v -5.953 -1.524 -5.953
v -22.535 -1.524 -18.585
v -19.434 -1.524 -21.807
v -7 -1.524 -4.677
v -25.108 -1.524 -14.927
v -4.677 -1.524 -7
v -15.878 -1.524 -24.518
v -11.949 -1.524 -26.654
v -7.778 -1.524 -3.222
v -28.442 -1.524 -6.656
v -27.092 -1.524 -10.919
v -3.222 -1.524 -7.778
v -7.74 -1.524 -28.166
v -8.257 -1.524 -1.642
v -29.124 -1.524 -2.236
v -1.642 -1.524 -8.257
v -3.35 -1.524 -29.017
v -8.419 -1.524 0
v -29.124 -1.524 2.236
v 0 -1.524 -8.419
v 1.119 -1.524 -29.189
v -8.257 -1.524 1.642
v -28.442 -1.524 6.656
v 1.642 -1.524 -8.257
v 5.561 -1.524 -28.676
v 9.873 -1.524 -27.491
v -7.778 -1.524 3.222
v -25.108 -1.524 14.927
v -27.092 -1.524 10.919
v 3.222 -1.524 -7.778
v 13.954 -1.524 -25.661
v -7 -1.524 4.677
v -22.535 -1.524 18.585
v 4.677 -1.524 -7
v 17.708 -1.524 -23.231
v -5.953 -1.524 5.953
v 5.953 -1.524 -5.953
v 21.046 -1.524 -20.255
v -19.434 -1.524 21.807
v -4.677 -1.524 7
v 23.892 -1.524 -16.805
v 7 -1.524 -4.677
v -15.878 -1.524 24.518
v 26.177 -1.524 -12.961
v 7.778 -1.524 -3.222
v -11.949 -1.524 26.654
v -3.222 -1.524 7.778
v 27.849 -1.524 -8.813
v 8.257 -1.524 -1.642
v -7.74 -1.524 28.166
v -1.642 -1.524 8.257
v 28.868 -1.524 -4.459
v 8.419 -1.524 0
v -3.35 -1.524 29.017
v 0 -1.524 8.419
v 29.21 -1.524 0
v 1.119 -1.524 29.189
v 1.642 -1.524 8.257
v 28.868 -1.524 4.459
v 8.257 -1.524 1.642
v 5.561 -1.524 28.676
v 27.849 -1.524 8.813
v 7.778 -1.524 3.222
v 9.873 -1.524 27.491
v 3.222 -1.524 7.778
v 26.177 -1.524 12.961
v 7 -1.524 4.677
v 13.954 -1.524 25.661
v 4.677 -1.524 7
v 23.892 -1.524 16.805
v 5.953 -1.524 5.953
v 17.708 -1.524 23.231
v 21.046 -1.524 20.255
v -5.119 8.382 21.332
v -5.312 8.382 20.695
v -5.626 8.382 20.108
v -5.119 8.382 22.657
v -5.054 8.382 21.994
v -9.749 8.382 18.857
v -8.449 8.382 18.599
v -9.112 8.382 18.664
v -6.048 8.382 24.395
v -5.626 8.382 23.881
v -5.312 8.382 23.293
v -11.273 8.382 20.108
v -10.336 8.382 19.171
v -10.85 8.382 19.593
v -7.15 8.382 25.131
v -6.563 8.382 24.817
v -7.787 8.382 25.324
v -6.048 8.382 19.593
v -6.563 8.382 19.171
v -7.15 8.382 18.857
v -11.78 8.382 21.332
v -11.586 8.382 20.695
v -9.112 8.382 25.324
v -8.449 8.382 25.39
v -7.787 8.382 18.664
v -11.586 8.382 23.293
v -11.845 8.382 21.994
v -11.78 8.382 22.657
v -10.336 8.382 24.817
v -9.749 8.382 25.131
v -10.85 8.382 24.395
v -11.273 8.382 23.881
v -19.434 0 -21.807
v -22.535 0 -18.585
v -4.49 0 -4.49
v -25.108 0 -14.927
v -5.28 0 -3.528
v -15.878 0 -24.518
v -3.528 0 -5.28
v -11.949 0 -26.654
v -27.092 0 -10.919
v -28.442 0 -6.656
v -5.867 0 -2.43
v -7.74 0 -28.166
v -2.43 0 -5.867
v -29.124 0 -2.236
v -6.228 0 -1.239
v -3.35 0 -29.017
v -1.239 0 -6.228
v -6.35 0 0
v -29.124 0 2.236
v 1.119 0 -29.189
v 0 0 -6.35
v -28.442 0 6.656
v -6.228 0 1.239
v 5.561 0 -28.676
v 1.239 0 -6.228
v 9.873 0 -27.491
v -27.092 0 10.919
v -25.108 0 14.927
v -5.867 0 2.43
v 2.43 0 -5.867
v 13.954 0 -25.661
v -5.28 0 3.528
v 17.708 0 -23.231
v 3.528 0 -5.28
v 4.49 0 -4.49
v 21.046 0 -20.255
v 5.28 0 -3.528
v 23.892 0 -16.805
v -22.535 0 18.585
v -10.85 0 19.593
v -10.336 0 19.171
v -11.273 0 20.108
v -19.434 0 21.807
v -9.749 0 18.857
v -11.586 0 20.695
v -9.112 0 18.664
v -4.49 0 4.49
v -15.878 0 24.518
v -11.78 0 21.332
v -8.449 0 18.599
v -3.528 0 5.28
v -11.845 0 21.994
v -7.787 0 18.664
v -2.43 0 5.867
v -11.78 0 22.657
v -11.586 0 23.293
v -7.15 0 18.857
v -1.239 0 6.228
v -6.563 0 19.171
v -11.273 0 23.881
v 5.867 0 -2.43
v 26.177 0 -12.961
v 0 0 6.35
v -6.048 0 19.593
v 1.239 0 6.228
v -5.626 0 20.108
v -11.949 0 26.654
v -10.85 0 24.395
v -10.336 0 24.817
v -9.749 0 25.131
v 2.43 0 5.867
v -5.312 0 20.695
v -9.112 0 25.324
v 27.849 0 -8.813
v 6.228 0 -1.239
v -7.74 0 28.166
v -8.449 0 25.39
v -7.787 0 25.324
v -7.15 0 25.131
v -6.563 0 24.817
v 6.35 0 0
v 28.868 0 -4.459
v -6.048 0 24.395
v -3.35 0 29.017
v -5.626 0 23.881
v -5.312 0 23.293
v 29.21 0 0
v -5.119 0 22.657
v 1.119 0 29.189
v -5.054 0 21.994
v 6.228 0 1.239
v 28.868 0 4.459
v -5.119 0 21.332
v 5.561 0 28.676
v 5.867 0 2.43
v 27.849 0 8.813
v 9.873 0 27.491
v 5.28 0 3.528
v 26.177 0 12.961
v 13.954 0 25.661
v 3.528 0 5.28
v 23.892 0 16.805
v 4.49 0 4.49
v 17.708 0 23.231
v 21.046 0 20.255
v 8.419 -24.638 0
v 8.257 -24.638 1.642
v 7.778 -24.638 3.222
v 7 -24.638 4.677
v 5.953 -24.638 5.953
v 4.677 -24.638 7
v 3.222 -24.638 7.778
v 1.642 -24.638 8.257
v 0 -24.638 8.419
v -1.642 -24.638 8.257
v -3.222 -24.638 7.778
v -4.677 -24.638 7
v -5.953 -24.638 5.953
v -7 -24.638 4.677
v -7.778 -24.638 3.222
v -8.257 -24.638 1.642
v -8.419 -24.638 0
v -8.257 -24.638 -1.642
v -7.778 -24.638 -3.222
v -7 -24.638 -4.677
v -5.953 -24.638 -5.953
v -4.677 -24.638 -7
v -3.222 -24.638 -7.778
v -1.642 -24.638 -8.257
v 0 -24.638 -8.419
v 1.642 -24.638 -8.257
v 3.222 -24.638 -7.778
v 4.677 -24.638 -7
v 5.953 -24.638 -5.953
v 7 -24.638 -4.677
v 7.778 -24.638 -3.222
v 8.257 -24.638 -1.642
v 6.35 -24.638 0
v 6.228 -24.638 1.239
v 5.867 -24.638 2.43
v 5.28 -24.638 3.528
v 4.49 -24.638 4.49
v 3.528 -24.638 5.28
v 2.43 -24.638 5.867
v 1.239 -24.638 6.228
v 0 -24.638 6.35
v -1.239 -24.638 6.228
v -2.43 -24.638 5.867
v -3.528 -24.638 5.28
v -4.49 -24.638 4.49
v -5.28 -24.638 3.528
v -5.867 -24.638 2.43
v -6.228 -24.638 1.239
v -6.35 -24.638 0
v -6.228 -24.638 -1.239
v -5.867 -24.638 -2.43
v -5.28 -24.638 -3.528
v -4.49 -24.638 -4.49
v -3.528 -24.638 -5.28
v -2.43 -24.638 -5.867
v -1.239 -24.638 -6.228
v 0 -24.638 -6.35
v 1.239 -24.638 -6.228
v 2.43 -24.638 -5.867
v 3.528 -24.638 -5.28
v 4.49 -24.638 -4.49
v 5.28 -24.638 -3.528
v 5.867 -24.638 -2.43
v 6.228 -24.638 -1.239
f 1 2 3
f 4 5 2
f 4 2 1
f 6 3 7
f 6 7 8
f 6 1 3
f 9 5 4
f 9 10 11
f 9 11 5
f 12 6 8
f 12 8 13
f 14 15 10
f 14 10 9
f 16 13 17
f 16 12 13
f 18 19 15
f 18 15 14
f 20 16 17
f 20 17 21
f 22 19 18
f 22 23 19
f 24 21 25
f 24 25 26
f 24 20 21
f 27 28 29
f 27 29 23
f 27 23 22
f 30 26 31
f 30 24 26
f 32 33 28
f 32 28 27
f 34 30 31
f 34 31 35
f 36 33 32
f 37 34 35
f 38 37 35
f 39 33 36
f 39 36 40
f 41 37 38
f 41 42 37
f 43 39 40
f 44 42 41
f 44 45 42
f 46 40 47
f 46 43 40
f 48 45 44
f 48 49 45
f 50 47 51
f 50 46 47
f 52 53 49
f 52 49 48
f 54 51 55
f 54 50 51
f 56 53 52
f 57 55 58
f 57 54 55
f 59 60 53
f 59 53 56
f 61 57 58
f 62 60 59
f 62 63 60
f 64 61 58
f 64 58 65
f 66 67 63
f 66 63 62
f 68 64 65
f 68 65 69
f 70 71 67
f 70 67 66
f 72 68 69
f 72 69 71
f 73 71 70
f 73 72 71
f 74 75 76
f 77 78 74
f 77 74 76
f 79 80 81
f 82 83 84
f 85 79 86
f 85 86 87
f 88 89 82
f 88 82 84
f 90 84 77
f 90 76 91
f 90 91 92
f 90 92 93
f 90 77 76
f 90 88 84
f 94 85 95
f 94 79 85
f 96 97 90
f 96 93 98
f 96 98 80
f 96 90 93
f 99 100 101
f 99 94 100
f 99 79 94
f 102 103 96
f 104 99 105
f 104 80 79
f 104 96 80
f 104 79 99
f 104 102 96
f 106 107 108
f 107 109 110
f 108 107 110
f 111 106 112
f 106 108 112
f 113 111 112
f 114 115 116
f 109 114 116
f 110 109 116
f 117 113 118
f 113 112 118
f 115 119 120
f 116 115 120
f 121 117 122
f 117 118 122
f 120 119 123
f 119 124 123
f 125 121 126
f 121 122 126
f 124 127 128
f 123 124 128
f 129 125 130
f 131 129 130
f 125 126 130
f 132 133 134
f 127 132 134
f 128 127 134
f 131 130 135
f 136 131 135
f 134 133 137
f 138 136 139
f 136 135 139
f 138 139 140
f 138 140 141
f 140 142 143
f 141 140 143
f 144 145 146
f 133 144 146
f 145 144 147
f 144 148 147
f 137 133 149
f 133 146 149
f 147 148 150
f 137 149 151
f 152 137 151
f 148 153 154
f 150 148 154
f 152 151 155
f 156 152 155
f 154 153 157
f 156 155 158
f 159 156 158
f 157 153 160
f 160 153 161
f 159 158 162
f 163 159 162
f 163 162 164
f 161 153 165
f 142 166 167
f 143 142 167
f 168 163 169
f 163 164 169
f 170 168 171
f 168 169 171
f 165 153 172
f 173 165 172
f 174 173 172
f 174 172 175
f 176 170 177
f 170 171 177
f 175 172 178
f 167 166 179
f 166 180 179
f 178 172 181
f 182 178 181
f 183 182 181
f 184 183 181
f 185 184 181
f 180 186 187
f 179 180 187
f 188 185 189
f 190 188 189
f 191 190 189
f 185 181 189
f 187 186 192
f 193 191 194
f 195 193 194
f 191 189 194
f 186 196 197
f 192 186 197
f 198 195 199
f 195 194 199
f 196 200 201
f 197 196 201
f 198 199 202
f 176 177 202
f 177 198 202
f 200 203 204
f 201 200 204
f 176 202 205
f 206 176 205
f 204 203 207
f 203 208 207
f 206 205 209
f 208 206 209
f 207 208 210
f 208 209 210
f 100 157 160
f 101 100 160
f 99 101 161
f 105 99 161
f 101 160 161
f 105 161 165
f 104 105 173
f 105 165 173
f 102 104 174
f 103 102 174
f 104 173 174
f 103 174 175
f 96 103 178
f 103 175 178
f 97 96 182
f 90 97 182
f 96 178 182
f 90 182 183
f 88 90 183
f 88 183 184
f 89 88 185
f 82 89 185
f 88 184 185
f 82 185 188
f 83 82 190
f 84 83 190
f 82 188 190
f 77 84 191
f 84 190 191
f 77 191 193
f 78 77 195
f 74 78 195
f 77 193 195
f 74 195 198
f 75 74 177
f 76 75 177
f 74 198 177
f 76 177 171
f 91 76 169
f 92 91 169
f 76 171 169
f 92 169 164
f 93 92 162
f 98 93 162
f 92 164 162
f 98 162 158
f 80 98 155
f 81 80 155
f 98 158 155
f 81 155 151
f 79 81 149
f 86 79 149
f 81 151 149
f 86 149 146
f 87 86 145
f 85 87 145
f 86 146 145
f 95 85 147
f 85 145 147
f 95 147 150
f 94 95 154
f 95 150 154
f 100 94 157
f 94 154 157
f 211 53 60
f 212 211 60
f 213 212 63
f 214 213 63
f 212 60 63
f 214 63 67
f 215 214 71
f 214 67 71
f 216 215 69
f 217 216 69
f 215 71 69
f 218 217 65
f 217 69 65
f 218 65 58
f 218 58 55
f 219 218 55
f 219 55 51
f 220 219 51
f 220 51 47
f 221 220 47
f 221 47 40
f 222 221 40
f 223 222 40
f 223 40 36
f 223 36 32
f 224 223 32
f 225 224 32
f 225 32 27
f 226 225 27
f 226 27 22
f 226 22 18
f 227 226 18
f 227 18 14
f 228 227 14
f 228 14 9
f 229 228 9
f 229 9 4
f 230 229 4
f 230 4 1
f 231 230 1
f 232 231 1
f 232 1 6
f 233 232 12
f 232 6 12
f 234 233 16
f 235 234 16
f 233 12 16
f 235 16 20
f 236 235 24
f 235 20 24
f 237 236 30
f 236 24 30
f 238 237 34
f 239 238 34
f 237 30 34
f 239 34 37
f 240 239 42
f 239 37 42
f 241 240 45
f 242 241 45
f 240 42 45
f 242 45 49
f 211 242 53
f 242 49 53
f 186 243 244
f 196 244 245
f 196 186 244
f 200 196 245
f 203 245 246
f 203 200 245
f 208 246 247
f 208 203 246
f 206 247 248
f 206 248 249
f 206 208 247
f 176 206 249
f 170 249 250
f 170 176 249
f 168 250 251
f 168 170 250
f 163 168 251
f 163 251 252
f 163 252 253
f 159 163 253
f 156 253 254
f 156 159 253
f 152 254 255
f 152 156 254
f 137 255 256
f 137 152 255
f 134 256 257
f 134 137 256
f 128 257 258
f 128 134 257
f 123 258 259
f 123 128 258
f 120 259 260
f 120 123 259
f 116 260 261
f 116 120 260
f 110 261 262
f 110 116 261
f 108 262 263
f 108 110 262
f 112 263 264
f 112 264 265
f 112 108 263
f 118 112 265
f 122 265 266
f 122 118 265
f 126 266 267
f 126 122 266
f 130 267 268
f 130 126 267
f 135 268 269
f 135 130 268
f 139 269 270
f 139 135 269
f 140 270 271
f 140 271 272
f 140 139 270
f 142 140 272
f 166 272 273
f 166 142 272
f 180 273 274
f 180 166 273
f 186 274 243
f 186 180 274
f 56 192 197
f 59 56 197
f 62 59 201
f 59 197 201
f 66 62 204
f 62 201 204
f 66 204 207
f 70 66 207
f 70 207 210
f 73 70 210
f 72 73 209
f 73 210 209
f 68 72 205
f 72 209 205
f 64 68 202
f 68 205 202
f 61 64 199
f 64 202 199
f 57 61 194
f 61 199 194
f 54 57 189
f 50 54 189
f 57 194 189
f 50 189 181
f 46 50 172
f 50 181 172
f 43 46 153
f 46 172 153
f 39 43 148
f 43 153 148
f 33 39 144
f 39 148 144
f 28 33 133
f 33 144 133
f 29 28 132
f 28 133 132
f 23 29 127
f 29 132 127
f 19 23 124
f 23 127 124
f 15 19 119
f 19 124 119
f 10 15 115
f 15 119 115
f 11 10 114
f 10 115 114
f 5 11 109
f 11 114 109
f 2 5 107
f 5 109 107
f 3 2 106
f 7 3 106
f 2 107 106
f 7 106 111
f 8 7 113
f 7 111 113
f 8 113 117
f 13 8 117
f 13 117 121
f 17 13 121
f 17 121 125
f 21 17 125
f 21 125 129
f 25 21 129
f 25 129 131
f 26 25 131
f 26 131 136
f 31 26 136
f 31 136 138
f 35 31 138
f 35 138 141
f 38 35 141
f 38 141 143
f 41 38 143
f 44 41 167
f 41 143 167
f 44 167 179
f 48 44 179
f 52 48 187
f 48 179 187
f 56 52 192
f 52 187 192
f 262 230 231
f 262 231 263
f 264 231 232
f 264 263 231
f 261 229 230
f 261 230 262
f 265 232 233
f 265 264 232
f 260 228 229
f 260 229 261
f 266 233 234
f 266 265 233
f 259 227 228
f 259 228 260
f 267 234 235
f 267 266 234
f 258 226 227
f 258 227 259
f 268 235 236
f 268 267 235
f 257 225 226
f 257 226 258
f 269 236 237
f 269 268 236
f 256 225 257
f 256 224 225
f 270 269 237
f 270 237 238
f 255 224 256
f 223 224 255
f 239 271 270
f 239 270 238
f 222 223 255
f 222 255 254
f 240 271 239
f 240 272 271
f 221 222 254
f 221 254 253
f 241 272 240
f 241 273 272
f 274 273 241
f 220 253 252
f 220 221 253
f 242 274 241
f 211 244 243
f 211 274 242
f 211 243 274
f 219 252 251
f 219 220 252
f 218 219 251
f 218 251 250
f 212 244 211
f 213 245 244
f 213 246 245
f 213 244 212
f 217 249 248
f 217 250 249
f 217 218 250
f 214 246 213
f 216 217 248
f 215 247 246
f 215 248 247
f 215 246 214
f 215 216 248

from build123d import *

# Parameters (mm, degrees)
F0_R     = 29.21
F0_R_2   = 8.4188415788
F1_DEPTH = 1.524
F0_R_3   = 6.35
F2_DEPTH = 24.638
F3_R     = 3.3954821981
F4_DEPTH = 8.382


with BuildPart() as f1:
    # F0 (on Front) → F1 (new body)
    with BuildSketch(Plane.XZ):
        Circle(F0_R)
        Circle(F0_R_2, mode=Mode.SUBTRACT)
    extrude(amount=F1_DEPTH)

    # F0 (on Front) → F2 (join)
    with BuildSketch(Plane.XZ):
        Circle(F0_R_2)
        Circle(F0_R_3, mode=Mode.SUBTRACT)
    extrude(amount=F2_DEPTH)

    # F3 (on face) → F4 (join)
    with BuildSketch(Plane(origin=(0, 0, 0), x_dir=(-1, 0, 0), z_dir=(0, 1, 0))):
        with Locations((8.4494473413, 21.9940822572)):
            Circle(F3_R)
    extrude(amount=F4_DEPTH)


solid = f1.part
